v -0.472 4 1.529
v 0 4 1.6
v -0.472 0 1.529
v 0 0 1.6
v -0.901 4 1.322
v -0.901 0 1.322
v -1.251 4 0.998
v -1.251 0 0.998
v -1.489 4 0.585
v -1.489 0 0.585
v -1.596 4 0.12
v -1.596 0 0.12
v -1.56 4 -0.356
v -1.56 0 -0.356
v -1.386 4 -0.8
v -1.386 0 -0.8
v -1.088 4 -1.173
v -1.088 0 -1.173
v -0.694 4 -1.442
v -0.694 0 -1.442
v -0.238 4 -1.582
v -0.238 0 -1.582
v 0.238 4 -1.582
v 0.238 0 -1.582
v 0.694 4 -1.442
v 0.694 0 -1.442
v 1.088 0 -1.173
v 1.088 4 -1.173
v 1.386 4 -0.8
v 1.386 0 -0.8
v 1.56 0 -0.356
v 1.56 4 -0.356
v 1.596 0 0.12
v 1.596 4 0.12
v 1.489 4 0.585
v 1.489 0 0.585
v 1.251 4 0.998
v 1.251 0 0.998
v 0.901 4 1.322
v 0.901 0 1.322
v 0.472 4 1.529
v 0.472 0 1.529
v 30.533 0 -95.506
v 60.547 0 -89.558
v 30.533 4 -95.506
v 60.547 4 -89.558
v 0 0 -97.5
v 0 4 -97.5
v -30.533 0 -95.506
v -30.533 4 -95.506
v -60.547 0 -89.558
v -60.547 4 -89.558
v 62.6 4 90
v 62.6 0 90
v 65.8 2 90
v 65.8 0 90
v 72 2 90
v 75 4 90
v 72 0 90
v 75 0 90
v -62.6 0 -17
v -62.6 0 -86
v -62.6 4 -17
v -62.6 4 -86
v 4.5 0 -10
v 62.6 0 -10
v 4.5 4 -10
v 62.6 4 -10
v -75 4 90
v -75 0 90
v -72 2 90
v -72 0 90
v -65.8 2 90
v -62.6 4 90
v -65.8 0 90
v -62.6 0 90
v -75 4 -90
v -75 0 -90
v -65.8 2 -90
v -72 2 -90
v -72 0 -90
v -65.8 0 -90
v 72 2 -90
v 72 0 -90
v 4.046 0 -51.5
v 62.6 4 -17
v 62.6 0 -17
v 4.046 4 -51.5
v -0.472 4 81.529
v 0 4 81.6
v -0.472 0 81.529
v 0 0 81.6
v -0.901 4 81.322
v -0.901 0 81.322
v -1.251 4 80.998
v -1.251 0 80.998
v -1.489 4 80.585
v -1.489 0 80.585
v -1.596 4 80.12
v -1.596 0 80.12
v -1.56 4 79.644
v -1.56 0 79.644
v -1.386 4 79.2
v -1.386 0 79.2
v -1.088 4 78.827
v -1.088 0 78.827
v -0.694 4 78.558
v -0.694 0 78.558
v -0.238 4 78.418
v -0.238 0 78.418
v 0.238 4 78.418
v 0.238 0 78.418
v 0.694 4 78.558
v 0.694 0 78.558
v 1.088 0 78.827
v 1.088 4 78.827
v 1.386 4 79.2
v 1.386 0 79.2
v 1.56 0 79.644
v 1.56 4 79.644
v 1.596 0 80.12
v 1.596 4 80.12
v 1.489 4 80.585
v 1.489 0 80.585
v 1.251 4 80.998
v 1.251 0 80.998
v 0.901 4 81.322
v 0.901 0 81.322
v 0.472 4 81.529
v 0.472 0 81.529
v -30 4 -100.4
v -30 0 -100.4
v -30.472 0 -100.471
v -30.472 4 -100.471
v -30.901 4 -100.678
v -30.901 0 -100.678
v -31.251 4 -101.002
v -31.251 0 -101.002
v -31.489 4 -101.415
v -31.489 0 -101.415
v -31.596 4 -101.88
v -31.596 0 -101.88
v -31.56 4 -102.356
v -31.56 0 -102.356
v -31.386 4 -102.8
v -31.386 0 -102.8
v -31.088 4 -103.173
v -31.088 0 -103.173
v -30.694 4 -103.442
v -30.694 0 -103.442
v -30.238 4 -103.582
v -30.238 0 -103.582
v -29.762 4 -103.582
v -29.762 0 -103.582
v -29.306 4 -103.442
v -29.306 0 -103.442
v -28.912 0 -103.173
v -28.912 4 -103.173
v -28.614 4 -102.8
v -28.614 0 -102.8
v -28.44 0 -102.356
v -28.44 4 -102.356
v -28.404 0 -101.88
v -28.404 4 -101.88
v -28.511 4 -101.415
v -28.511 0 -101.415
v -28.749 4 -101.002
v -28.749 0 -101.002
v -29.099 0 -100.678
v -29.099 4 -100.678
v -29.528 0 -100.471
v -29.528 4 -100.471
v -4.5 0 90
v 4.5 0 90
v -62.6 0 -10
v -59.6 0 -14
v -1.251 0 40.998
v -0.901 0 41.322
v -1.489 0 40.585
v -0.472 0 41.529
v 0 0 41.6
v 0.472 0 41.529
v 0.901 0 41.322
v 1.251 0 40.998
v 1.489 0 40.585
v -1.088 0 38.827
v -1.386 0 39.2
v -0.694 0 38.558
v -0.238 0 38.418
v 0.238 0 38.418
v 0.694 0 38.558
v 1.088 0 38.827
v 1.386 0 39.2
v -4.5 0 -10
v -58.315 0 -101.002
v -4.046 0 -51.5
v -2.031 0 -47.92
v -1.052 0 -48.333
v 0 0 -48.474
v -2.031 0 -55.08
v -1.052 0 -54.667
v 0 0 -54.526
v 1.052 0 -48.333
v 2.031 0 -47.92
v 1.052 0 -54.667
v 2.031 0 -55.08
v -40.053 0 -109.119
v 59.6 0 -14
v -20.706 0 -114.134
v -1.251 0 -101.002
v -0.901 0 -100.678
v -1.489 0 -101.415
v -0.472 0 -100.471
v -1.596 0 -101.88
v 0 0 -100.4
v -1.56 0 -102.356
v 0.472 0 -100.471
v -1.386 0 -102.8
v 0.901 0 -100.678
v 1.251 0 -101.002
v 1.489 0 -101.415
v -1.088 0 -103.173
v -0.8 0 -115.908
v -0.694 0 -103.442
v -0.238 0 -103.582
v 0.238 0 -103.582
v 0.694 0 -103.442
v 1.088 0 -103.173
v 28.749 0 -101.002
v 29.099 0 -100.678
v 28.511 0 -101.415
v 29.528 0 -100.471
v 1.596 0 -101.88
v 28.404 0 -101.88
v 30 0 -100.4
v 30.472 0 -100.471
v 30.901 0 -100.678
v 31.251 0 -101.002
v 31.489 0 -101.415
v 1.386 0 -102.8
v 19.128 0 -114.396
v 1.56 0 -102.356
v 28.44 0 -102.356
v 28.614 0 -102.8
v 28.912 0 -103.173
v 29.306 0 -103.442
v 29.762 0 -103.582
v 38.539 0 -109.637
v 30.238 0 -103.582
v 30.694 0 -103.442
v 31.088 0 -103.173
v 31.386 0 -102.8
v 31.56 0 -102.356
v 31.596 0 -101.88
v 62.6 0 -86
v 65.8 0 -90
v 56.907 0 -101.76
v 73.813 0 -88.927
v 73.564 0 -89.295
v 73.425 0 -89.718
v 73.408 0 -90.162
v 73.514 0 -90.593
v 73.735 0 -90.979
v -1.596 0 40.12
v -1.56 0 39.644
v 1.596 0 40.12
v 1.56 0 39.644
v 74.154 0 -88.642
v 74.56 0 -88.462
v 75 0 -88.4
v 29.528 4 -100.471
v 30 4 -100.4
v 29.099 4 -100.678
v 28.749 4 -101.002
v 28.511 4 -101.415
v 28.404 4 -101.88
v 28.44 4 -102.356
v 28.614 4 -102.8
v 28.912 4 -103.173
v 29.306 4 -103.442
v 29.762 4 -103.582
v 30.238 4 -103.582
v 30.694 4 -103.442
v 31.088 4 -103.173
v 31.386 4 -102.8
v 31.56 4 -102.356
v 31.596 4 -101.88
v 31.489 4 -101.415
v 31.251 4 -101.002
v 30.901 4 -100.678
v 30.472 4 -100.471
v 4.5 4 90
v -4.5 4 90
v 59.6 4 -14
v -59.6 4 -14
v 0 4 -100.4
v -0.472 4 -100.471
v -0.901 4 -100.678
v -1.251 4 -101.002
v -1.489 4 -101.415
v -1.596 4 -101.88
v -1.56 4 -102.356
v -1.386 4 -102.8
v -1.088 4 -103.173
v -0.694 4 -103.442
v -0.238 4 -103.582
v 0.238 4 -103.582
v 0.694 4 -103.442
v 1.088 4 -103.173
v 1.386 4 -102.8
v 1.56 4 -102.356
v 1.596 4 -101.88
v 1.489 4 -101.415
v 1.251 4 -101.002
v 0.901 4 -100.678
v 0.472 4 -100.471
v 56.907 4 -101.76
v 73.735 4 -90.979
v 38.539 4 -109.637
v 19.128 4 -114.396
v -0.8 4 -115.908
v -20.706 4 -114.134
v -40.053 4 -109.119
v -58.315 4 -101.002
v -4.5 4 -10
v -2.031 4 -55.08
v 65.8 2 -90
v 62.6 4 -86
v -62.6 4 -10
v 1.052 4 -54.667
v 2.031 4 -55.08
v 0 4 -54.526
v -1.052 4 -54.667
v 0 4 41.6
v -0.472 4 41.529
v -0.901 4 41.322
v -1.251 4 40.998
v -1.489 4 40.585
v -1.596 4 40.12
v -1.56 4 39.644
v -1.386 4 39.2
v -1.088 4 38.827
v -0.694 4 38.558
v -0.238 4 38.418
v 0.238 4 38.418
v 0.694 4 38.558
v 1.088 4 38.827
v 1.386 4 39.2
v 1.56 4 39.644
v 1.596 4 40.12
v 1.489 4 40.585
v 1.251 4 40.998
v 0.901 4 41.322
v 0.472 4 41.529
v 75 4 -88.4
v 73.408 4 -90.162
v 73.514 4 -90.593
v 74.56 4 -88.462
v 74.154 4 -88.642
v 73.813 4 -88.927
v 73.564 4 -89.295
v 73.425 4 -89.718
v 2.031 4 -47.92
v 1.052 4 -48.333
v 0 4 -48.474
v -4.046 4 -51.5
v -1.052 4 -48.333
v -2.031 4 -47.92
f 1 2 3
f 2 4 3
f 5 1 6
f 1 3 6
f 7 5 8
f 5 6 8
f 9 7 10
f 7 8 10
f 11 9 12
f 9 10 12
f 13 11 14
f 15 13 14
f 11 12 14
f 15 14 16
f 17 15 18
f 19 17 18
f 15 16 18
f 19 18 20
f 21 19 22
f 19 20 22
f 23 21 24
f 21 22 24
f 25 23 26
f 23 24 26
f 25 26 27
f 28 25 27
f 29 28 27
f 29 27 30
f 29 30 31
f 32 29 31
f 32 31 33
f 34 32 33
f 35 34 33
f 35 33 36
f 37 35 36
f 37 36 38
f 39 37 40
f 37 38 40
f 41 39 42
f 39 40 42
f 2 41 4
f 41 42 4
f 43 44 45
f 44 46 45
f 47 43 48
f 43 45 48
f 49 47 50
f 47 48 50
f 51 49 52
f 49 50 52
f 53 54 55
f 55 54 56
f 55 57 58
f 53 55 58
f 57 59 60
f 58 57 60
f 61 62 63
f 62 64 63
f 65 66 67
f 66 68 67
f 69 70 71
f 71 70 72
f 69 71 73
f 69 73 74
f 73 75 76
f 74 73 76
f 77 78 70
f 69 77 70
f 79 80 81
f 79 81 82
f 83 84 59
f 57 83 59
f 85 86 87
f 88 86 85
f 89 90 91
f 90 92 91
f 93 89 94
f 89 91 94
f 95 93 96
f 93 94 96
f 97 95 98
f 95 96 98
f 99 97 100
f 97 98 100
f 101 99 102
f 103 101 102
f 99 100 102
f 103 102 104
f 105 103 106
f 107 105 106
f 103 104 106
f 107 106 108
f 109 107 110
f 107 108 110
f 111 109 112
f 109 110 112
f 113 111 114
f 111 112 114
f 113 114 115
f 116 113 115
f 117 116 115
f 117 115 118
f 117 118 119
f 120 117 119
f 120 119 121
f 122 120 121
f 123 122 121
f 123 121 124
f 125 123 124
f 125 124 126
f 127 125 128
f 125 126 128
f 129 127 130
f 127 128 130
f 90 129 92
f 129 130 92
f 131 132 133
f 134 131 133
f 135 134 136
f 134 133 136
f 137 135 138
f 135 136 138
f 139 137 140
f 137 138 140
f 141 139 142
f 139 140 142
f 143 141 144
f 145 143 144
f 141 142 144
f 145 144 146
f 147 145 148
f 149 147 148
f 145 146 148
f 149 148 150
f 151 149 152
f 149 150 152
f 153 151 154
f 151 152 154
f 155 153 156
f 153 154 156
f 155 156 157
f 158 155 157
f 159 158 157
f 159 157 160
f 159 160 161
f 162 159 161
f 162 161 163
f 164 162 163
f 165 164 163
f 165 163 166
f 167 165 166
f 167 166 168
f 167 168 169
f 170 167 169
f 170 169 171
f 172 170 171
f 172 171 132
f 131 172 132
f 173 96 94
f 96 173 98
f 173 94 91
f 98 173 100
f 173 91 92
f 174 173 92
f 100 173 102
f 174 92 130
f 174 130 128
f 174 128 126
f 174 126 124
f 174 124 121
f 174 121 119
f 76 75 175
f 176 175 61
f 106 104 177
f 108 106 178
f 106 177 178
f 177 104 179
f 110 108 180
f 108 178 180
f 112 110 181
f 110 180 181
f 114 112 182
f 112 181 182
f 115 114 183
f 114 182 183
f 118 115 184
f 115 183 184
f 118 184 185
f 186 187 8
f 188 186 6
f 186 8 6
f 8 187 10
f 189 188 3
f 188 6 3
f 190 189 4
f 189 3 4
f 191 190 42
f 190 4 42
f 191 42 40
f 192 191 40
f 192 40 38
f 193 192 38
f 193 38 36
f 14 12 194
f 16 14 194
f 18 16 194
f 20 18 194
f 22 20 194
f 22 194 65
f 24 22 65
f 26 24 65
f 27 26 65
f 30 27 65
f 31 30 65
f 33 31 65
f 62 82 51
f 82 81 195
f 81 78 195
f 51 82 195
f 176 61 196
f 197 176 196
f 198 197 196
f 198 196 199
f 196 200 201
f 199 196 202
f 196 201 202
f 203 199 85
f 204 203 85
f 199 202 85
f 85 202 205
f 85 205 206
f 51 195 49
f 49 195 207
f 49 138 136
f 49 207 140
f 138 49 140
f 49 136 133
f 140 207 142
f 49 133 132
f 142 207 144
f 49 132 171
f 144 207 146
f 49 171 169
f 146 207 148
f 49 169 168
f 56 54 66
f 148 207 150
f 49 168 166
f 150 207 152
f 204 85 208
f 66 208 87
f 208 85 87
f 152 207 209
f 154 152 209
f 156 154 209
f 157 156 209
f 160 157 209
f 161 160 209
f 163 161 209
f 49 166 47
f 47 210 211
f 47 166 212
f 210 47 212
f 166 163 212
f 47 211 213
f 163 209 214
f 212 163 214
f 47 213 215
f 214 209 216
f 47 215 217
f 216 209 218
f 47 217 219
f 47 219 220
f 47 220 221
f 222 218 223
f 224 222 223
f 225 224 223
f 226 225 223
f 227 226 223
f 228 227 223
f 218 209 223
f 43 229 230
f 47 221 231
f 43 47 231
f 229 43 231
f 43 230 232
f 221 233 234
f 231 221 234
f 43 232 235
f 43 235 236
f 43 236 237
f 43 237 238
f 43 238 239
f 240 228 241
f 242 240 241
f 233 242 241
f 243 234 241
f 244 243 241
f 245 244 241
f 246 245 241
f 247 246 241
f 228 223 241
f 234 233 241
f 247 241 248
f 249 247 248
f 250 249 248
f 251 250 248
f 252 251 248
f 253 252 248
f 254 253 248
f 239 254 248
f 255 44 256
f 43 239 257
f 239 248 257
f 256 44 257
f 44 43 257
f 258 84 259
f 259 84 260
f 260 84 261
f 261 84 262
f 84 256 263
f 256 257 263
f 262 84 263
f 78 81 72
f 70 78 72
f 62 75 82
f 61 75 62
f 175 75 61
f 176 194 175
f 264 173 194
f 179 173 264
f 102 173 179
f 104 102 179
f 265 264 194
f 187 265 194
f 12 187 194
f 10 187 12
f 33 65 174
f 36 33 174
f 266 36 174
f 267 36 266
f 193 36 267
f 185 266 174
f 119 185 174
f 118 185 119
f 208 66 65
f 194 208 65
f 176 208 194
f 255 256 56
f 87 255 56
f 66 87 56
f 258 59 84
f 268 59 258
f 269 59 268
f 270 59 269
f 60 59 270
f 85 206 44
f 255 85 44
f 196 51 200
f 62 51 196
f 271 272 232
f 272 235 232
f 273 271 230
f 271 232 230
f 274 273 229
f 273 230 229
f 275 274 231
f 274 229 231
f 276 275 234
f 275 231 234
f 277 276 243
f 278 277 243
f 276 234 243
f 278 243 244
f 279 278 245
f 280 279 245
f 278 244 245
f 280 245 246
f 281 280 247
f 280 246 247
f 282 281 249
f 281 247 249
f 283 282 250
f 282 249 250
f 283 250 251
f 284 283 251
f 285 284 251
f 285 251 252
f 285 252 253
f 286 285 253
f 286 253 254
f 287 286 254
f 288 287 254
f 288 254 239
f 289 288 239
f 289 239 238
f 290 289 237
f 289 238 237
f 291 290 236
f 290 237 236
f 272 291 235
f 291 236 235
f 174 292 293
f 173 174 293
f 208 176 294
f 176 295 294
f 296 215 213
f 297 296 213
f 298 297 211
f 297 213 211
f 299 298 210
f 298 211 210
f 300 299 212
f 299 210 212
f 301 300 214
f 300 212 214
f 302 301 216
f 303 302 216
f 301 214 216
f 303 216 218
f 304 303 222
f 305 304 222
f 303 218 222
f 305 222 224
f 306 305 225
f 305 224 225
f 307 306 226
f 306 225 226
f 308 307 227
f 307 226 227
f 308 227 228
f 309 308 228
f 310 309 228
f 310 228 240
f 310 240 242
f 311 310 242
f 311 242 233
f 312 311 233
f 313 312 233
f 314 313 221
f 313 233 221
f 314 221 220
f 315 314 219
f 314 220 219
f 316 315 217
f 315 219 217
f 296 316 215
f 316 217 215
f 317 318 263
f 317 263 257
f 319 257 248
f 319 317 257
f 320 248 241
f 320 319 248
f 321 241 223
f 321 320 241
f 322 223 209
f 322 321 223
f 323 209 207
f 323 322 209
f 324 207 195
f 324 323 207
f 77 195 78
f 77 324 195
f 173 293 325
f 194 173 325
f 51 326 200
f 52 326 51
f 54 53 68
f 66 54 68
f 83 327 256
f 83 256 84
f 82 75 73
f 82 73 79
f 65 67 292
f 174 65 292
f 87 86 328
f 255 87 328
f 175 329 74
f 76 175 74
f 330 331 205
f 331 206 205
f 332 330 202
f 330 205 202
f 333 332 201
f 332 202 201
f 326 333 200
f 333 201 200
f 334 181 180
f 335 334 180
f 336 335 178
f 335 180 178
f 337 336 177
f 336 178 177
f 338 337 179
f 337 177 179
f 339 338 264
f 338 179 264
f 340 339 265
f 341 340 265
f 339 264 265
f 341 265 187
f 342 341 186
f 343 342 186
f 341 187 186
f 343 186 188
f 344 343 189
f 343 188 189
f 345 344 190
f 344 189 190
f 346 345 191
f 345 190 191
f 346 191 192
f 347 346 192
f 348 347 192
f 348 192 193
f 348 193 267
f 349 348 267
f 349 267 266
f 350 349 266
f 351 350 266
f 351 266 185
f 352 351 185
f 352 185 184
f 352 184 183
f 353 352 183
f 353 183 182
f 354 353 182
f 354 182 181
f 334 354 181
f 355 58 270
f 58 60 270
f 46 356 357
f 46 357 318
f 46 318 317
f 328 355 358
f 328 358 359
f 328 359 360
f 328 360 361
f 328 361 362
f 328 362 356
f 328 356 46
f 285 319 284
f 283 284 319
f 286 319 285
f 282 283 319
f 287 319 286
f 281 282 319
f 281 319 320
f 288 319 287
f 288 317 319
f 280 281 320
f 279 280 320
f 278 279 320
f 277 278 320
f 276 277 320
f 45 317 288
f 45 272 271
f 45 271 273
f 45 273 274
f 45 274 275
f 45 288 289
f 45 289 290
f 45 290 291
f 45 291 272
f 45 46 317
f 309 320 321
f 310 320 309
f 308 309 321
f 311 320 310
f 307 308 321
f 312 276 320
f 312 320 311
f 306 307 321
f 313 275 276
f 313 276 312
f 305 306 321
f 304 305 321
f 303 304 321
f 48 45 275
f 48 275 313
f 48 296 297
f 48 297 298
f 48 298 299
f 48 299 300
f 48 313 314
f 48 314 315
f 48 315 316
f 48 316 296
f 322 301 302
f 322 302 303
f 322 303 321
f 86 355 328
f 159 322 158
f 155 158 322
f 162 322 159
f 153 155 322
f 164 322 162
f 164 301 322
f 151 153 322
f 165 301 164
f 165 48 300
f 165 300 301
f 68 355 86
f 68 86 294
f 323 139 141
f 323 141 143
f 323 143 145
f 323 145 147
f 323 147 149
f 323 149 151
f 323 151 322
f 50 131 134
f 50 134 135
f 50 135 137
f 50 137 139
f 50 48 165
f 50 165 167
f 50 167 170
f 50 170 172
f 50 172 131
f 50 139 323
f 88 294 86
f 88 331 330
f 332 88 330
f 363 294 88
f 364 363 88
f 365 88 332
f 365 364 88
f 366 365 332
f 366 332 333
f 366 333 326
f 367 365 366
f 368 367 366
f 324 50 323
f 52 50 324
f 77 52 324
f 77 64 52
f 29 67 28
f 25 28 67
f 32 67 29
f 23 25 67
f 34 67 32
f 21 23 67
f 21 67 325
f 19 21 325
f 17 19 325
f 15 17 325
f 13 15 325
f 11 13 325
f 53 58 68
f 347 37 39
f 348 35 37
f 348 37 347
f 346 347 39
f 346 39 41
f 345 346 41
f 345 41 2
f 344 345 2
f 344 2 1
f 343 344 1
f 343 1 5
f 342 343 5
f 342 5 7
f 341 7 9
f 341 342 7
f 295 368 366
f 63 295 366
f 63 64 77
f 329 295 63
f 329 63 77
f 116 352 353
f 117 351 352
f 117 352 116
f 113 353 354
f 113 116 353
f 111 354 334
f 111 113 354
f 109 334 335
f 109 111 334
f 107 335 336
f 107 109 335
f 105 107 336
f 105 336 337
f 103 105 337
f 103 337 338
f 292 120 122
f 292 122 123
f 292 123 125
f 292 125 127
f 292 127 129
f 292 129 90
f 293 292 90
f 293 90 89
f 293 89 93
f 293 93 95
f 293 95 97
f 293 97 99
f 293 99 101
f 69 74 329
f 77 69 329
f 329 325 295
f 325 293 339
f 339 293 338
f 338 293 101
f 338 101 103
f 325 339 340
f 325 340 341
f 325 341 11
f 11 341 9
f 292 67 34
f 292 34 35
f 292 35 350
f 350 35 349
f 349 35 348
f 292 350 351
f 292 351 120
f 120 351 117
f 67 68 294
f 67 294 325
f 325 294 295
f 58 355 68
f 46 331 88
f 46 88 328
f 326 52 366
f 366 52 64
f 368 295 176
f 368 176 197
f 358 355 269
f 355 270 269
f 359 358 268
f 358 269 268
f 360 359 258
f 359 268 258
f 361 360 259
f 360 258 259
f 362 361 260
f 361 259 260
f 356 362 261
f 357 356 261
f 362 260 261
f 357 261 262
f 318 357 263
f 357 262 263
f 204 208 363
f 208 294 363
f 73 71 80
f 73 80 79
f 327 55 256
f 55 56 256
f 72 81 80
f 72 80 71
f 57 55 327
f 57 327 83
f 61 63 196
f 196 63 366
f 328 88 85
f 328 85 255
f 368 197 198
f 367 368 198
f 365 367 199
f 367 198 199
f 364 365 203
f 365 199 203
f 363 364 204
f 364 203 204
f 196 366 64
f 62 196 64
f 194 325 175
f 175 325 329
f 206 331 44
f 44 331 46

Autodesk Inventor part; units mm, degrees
ref_plane "YZ Plane" through (0, 0, 0) normal (1, 0, 0) x (0, 1, 0)
ref_plane "XZ Plane" through (0, 0, 0) normal (0, 1, 0) x (-1, 0, 0)
ref_plane "XY Plane" through (0, 0, 0) normal (0, 0, 1) x (1, 0, 0)
sketch "スケッチ1" plane through (0, 0, 0) normal (0, 1, 0) x (-1, 0, 0)
  line L0 (-75, -90) -> (75, -90)
  line L1 (75, -90) -> (75, 90)
  line L2 (75, 90) -> (-75, 90)
  line L3 (-75, 90) -> (-75, -90)
  line L4 (-75, -90) -> (75, 90) construction
  line L5 (75, -90) -> (-75, 90) construction
  point P0 (0, 0)
  dimension "d0" = 150
  dimension "d1" = 180
extrude "押し出し1" add sketch "スケッチ1" along normal blind 4
sketch "スケッチ2" plane through (0, 4, 0) normal (0, 1, 0) x (1, 0, 0)
  line L0 (-75, -90) -> (75, -90) projected
  line L1 (-62.6, -90) -> (62.6, -90)
  line L2 (62.6, -90) -> (62.6, 10)
  line L3 (62.6, 10) -> (-62.6, 10)
  line L4 (-62.6, 10) -> (-62.6, -90)
  point P0 (0, 0)
  dimension "d4" = 125.2
  dimension "d5" = 100
  dimension "d6" = 62.6
extrude "押し出し2" cut sketch "スケッチ2" against normal blind 4
sketch "スケッチ3" plane through (0, 0, 0) normal (0, -1, 0) x (1, 0, 0)
  line L0 (62.6, 90) -> (75, 90) projected
  line L1 (72, 90) -> (65.8, 90)
  line L2 (65.8, 90) -> (65.8, -90)
  line L3 (65.8, -90) -> (72, -90)
  line L4 (72, -90) -> (72, 90)
  line L5 (75, 90) -> (75, -90) projected
  line L6 (0, 0) -> (0, 35.088)
  line L7 (-62.6, 90) -> (-75, 90)
  line L8 (-72, 90) -> (-65.8, 90)
  line L9 (-65.8, 90) -> (-65.8, -90)
  line L10 (-65.8, -90) -> (-72, -90)
  line L11 (-72, -90) -> (-72, 90)
  line L12 (-75, 90) -> (-75, -90)
  dimension "d9" = 6.2
  dimension "d10" = 180
  dimension "d11" = 3
extrude "押し出し3" cut sketch "スケッチ3" against normal blind 2
sketch "スケッチ4" plane through (0, 4, 0) normal (0, 1, 0) x (1, 0, 0)
  line L0 (62.6, 10) -> (-62.6, 10) projected
  line L1 (-4.5, 10) -> (4.5, 10)
  line L2 (4.5, 10) -> (4.5, -90)
  line L3 (4.5, -90) -> (-4.5, -90)
  line L4 (-4.5, -90) -> (-4.5, 10)
  point P0 (0, 0)
  dimension "d14" = 9
  dimension "d15" = 100
  dimension "d16" = 4.5
extrude "押し出し4" add sketch "スケッチ4" against normal blind 4
sketch "スケッチ5" plane through (0, 4, 0) normal (0, 1, 0) x (1, 0, 0)
  circle A0 centre (0, -5.589) radius 121.5
  line L0 (75, 90) -> (72, 90) projected
  line L1 (-75, 90) -> (-75, -90) projected
  line L2 (-75, 90) -> (75, 90)
  point P0 (0, 0)
  dimension "d19" = 243
extrude "押し出し5" add sketch "スケッチ5" against normal blind 4 contours L0 L2 A0 picked at (-21.9725, 92.7838)
sketch "スケッチ6" plane through (0, 4, 0) normal (0, 1, 0) x (1, 0, 0)
  arc A0 (75, 90) -> (-75, 90) centre (0, -5.589) ccw projected
  line L0 (75, 90) -> (-75, 90) construction
  line L1 (0, 90) -> (0, 115.911) construction
  point P0 (0, 0)
  point P1 (0, 102)
  point P2 (30, 102)
  point P3 (-30, 102)
  dimension "d22" = 12
  dimension "d23" = 30
hole "穴1" at (75, 4, -90) at (0, 4, -102) at (30, 4, -102) at (-30, 4, -102) direction (0, -1, 0) diameter 3.2 end through all
sketch "スケッチ7" plane through (0, 4, 0) normal (0, 1, 0) x (1, 0, 0)
  line L0 (-62.6, 10) -> (-4.5, 10) projected
  line L1 (-62.6, 14) -> (62.6, 14)
  line L2 (62.6, 14) -> (62.6, 89)
  line L3 (-62.6, 89) -> (-62.6, 14)
  arc A0 (62.6, 89) -> (-62.6, 89) centre (0, -137.2653) ccw
  line L4 (-59.6, 14) -> (62.6, 86)
  line L5 (-62.6, 17) -> (60.547, 89.558)
  line L6 (0, 14) -> (0, 41.0158)
  line L7 (59.6, 14) -> (-62.6, 86)
  line L8 (62.6, 17) -> (-60.547, 89.558)
  point P0 (0, 0)
  point P1 (0, 97.5)
  point P2 (0, 53.8838)
  point P3 (-4.0458, 51.5)
  point P4 (0, 49.1162)
  point P5 (4.0458, 51.5)
  dimension "d32" = 4
  dimension "d33" = 125.2
  dimension "d34" = 75
  dimension "d36" = 3
  dimension "d37" = 3
  dimension "d38" = 3
extrude "押し出し6" cut sketch "スケッチ7" against normal blind 4 contours L4 L7 L1 | L3 L7 L5 | L4 L2 L8 | L8 A0 L5
sketch "スケッチ8" plane through (0, 4, 0) normal (0, 1, 0) x (1, 0, 0)
  line L0 (-62.6, 10) -> (-4.5, 10) projected
  point P0 (0, 0)
  point P1 (0, 0)
  point P2 (0, -40)
  point P3 (0, -80)
  dimension "d41" = 10
  dimension "d42" = 50
  dimension "d43" = 90
hole "穴2" at (0, 4, 0) at (0, 4, 40) at (0, 4, 80) direction (0, -1, 0) diameter 3.2 end through all
fillet "フィレット1" radius 4 2 edges at (0, 2, -49.1162) (0, 2, -53.8838)
properties part number "お盆4" material "アルミニウム 2014-T6"
